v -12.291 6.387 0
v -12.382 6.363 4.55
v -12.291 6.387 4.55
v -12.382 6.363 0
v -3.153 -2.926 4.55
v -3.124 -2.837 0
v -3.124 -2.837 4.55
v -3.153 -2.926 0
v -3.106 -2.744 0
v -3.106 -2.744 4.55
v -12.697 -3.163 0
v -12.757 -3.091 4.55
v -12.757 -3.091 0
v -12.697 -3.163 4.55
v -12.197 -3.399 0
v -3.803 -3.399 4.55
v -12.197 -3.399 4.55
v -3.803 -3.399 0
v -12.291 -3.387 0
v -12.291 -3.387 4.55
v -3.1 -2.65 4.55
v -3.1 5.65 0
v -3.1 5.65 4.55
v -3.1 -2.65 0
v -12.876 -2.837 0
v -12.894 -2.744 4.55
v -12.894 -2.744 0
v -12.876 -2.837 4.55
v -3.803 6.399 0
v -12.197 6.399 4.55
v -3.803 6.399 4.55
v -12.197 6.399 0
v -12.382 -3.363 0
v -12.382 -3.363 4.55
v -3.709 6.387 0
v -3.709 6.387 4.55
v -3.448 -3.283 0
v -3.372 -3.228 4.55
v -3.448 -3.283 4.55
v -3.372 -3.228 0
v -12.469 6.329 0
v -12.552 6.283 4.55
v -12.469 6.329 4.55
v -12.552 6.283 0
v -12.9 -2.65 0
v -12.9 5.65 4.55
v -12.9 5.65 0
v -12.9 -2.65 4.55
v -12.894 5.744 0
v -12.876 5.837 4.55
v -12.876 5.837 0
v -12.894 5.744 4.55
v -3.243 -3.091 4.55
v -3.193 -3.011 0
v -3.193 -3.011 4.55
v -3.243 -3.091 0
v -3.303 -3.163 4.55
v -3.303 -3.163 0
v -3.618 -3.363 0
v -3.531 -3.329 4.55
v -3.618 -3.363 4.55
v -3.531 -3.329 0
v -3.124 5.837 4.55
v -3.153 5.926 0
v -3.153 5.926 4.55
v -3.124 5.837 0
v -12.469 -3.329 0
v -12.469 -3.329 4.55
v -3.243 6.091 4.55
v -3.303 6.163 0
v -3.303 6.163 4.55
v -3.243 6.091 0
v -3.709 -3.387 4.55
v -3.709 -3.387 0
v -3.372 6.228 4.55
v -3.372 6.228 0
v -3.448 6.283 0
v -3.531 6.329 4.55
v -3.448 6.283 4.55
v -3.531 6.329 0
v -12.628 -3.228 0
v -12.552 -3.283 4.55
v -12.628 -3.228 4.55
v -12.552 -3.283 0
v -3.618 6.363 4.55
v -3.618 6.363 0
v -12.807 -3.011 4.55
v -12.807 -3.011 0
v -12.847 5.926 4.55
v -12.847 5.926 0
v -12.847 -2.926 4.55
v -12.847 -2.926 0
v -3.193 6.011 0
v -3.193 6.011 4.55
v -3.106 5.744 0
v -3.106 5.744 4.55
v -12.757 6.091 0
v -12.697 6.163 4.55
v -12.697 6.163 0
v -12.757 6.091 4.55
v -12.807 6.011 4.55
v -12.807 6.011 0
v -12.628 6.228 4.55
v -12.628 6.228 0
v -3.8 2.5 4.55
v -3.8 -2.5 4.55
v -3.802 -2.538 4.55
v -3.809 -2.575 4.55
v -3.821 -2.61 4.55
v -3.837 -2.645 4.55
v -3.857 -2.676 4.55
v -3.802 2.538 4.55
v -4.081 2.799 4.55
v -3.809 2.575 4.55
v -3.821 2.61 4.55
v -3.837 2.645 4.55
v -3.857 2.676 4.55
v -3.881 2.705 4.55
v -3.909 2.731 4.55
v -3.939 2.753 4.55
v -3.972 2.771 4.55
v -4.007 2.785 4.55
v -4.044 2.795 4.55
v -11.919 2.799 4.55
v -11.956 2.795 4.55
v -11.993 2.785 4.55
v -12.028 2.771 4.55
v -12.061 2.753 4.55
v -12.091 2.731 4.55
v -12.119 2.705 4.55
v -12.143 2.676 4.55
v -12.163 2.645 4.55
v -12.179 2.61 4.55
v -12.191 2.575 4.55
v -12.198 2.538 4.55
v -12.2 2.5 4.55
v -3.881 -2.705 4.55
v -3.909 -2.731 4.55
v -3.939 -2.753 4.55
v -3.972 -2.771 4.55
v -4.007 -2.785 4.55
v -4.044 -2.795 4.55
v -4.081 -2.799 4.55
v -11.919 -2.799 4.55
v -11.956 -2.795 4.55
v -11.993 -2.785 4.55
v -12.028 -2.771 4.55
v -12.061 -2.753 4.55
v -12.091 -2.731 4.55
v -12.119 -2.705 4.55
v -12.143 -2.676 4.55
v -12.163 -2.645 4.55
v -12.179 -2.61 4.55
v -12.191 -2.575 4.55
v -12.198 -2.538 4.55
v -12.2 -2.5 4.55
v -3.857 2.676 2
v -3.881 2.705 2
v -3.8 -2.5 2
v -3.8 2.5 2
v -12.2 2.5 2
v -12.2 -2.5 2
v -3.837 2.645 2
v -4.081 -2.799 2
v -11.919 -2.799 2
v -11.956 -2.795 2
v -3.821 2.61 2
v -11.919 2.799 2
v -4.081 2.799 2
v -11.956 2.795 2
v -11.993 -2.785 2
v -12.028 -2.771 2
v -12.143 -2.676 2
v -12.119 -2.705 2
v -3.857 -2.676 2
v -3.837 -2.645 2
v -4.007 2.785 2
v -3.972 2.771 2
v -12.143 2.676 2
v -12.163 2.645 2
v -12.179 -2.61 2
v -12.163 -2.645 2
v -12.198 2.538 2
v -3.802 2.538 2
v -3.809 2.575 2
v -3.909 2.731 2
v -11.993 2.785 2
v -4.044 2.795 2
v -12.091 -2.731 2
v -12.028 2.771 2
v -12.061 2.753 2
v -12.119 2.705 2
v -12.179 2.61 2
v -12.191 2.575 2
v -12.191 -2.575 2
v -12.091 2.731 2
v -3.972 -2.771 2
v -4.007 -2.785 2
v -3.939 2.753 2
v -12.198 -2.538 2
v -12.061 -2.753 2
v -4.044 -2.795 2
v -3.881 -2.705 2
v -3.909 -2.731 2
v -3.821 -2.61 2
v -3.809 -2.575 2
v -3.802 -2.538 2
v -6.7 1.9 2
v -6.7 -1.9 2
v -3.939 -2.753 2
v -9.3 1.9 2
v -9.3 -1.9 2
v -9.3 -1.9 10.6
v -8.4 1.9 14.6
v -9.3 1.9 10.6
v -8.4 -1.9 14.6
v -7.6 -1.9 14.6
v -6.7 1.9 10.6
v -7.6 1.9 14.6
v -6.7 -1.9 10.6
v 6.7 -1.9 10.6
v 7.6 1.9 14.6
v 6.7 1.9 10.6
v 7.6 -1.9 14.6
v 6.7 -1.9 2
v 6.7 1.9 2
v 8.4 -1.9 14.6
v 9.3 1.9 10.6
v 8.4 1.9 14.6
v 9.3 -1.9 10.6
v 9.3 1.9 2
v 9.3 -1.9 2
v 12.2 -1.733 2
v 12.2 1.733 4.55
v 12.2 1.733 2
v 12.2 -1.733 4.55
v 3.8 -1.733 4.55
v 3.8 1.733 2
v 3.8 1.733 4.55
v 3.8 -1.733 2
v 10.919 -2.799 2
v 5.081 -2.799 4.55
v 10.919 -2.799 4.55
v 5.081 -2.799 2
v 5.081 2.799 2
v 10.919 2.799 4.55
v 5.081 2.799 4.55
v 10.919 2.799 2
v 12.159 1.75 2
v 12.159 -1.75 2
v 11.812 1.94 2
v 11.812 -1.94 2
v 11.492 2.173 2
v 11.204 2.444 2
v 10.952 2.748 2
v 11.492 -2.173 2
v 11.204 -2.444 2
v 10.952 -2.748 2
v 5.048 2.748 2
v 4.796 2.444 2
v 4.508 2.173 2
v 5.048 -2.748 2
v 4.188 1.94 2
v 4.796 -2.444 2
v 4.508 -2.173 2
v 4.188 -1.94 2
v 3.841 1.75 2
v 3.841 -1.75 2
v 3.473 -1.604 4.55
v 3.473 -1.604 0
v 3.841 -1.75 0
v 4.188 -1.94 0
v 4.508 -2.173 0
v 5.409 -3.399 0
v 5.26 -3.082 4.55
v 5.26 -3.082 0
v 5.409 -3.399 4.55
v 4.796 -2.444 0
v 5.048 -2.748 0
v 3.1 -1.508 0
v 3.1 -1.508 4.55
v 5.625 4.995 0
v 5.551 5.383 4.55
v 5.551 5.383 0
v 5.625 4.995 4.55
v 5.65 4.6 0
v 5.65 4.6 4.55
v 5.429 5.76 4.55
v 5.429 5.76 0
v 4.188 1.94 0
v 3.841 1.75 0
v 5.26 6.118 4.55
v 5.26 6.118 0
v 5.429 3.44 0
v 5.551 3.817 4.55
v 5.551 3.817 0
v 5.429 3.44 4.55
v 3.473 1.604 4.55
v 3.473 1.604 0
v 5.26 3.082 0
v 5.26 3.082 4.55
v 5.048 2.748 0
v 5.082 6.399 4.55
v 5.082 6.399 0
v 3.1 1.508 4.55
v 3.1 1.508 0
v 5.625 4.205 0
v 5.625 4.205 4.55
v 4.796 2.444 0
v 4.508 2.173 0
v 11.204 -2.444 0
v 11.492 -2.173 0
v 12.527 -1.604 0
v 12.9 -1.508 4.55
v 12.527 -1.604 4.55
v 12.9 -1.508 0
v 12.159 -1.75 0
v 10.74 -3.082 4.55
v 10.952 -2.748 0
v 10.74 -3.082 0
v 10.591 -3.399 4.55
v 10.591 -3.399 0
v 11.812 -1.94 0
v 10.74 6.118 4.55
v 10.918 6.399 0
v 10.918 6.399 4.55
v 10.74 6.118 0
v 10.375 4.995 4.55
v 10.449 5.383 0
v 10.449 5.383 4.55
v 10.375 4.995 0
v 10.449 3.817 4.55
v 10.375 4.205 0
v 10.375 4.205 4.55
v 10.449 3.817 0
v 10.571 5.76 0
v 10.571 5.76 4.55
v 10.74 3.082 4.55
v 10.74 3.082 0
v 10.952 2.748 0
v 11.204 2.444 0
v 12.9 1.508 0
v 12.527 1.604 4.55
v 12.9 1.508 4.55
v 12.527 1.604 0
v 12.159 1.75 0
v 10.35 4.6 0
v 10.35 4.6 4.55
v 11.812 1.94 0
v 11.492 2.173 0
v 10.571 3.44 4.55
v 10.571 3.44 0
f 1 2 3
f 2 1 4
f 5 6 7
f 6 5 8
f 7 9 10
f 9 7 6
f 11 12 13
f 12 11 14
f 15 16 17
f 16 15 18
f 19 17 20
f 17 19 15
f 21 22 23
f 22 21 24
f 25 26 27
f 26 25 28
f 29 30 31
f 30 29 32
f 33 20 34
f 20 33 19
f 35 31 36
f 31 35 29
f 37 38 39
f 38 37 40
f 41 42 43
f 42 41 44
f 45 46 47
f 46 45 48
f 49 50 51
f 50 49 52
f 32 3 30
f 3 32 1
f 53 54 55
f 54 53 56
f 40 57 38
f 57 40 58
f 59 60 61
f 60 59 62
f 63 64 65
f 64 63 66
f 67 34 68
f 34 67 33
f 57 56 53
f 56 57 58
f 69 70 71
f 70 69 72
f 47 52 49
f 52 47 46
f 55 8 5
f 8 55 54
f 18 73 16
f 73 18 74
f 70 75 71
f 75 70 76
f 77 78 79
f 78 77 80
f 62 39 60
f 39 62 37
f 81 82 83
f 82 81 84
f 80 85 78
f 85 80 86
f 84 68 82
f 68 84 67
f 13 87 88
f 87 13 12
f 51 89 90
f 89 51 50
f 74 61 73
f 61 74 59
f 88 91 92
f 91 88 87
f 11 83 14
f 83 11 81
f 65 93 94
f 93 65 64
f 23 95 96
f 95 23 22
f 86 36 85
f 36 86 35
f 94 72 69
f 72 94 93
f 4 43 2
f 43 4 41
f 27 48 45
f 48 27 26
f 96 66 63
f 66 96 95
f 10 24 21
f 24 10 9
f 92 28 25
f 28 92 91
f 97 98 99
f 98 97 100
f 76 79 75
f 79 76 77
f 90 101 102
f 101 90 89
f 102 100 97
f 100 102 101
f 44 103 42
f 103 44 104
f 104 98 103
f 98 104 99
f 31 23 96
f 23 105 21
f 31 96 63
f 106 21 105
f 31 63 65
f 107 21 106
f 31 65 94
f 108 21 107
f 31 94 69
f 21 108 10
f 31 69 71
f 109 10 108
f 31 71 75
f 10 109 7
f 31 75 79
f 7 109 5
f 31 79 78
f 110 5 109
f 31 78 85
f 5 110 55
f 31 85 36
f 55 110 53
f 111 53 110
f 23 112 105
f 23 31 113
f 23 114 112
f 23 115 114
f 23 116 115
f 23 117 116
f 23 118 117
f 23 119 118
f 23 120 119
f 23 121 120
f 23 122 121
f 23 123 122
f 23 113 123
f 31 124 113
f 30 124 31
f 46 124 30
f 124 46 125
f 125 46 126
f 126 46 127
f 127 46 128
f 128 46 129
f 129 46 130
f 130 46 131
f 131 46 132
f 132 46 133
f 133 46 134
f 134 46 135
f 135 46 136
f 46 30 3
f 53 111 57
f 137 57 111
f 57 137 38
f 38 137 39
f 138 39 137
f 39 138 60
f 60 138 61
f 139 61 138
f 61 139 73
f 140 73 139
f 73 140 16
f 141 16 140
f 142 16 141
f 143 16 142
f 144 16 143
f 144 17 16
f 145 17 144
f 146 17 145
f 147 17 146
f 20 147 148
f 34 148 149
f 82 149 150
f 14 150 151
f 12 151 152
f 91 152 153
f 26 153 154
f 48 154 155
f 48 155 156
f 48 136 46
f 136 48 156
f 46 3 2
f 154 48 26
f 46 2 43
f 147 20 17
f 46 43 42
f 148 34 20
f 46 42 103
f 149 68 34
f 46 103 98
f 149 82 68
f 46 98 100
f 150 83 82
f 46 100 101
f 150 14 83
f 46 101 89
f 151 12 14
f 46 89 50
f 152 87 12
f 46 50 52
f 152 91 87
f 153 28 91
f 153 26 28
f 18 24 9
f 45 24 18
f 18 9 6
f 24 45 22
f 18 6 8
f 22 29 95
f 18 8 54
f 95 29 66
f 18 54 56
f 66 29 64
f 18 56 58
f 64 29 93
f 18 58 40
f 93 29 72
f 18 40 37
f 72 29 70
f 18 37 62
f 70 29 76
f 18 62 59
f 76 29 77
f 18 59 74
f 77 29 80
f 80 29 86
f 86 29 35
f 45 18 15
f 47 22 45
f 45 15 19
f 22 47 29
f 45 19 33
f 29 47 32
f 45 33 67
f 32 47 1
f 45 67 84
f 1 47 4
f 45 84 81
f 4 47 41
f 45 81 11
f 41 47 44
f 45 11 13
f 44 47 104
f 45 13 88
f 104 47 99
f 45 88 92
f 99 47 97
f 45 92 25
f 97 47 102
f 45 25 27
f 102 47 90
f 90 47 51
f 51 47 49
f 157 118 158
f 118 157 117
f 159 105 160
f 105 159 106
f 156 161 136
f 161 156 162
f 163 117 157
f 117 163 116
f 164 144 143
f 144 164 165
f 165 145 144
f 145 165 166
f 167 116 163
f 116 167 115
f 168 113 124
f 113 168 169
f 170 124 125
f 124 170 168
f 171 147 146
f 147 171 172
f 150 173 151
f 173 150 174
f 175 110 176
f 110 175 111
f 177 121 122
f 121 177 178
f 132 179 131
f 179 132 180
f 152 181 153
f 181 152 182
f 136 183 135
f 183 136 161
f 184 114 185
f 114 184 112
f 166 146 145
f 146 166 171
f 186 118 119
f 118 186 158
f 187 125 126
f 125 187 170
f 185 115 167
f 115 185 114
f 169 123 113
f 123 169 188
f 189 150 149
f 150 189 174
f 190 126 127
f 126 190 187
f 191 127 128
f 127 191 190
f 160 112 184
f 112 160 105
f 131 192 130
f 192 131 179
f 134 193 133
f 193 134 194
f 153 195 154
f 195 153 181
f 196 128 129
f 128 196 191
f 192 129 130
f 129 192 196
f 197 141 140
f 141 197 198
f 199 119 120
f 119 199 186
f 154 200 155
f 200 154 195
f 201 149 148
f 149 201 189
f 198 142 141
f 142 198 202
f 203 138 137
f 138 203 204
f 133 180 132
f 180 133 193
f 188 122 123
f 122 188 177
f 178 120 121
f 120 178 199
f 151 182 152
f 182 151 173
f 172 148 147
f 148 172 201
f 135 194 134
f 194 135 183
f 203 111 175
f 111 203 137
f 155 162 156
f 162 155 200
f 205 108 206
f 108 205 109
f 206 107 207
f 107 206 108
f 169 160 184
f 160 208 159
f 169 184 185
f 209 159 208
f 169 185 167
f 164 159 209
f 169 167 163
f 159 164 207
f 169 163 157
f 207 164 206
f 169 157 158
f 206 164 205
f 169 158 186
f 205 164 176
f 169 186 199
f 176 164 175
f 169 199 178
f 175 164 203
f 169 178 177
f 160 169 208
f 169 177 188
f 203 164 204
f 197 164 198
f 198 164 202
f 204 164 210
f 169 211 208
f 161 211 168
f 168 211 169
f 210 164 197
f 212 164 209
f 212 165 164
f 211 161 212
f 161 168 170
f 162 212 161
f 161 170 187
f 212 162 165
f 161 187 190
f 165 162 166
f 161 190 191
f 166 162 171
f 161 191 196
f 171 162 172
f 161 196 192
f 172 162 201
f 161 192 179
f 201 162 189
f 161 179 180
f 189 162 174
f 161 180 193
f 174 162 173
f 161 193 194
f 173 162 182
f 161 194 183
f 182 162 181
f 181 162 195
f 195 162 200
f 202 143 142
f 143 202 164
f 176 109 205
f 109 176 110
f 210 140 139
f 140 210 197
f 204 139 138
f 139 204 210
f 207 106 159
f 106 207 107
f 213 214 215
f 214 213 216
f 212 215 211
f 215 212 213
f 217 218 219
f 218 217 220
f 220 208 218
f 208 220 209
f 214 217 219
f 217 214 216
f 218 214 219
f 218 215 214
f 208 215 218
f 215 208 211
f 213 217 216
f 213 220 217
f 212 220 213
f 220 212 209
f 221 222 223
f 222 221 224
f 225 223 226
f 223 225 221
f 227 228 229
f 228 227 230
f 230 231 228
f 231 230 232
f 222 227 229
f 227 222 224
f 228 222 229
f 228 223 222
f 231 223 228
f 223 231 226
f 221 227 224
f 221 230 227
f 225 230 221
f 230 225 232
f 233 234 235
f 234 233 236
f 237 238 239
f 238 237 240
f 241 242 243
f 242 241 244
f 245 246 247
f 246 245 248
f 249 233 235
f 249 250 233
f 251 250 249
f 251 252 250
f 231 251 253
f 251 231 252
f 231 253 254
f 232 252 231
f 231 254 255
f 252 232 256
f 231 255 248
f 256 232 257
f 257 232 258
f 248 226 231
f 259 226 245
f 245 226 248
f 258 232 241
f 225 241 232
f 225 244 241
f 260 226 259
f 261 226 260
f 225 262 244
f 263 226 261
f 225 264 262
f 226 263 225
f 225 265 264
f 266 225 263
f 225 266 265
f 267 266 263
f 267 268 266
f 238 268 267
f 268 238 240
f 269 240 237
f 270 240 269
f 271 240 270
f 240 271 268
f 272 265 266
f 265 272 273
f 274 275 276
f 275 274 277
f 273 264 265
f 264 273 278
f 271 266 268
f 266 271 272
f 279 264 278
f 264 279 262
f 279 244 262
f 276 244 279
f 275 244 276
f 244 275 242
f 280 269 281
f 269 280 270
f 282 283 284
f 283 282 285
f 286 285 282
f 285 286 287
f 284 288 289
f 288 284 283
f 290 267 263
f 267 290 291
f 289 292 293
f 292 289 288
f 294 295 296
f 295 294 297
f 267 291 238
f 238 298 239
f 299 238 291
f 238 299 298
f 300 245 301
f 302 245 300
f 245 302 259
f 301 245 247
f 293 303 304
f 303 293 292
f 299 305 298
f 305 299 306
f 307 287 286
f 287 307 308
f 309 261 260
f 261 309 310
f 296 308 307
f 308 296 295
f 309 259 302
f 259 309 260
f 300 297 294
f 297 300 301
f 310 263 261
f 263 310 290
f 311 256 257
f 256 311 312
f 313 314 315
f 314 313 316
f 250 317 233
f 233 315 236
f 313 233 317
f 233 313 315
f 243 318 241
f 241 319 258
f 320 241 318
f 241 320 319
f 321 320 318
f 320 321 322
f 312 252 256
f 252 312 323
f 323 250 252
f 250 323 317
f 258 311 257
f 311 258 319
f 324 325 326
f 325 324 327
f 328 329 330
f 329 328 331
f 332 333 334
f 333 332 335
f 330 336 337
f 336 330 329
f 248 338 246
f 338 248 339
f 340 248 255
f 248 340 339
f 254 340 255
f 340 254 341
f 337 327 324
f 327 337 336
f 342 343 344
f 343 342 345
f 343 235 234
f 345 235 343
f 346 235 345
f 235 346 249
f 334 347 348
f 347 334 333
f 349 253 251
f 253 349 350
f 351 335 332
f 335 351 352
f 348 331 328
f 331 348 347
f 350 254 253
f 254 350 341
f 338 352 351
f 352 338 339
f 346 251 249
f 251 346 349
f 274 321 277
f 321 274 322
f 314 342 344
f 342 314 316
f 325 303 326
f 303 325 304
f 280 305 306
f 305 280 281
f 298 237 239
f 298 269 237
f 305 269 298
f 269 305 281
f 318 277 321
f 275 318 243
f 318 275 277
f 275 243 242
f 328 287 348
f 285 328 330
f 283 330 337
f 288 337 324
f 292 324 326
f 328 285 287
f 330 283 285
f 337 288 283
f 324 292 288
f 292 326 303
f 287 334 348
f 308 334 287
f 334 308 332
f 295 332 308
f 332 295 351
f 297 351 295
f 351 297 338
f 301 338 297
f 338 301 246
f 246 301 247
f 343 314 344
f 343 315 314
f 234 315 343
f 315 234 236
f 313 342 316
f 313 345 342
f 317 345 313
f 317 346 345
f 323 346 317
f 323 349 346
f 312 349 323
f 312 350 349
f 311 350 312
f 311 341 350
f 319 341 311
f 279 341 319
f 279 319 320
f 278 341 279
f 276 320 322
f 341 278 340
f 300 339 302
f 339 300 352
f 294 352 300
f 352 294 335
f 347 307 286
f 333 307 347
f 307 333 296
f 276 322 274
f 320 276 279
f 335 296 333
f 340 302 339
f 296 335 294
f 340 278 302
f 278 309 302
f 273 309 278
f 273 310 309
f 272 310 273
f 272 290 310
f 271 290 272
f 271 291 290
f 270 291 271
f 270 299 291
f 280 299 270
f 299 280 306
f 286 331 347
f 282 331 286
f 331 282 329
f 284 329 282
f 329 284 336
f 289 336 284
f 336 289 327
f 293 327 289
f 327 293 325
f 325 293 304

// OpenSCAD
translate([-8,0,0]) { 
// Archived geometry from ../../parts/oobb_organization_storage_drawer_unit_rectangle_100_ml_tamper_evident_systempak_209_container_2_column_7_row_ai_version_7_style_double_sided_plywood_250_max/front_plug_square.scad
$fn = 50;

difference() {
	union() {
		translate(v = [0, 0, 0]) {
			rotate(a = [0, 0, 0]) {
				difference() {
					union() {
						translate(v = [0, 0, 0]) {
							rotate(a = [0, 0, 0]) {
								difference() {
									union() {
										translate(v = [0, 0, 0]) {
											rotate(a = [0, 0, 0]) {
												difference() {
													union() {
														translate(v = [0, 1.5, 0]) {
															hull() {
																translate(v = [-4.15, 4.15, 0]) {
																	cylinder(h = 4.55, r = 0.75);
																}
																translate(v = [4.15, 4.15, 0]) {
																	cylinder(h = 4.55, r = 0.75);
																}
																translate(v = [-4.15, -4.15, 0]) {
																	cylinder(h = 4.55, r = 0.75);
																}
																translate(v = [4.15, -4.15, 0]) {
																	cylinder(h = 4.55, r = 0.75);
																}
															}
														}
													}
													union() {
														translate(v = [0, 0, 2.0]) {
															hull() {
																translate(v = [-3.9000000000000004, 2.5, 0]) {
																	cylinder(h = 2.65, r = 0.3);
																}
																translate(v = [3.9000000000000004, 2.5, 0]) {
																	cylinder(h = 2.65, r = 0.3);
																}
																translate(v = [-3.9000000000000004, -2.5, 0]) {
																	cylinder(h = 2.65, r = 0.3);
																}
																translate(v = [3.9000000000000004, -2.5, 0]) {
																	cylinder(h = 2.65, r = 0.3);
																}
															}
														}
													}
												}
											}
										}
										translate(v = [0, 0, 0]) {
											rotate(a = [0, 0, 0]) {
												difference() {
													union() {
														translate(v = [-1.4000000000000001, -1.9, 1.95]) {
															cube(size = [2.8000000000000003, 3.8, 12.65]);
														}
													}
													union() {
														translate(v = [0, 2.0, 0]) {
															rotate(a = [90, 0, 0]) {
																linear_extrude(height = 4.0) {
																	polygon(points = [[-1.3, 1.85], [-1.3, 10.6], [-0.4, 14.6], [-0.4, 14.799999999999999], [-1.6, 14.799999999999999], [-1.6, 1.85]]);
																}
															}
														}
														translate(v = [0, 2.0, 0]) {
															rotate(a = [90, 0, 0]) {
																linear_extrude(height = 4.0) {
																	polygon(points = [[1.3, 1.85], [1.3, 10.6], [0.4, 14.6], [0.4, 14.799999999999999], [1.6, 14.799999999999999], [1.6, 1.85]]);
																}
															}
														}
													}
												}
											}
										}
									}
									union();
								}
							}
						}
					}
					union();
				}
			}
		}
	}
	union();
}
 }
translate([8,0,0]) { 
// Archived geometry from ../../parts/oobb_organization_storage_drawer_unit_rectangle_100_ml_tamper_evident_systempak_209_container_2_column_7_row_ai_version_7_style_double_sided_plywood_250_max/front_plug.scad
$fn = 50;

difference() {
	union() {
		translate(v = [0, 0, 0]) {
			rotate(a = [0, 0, 0]) {
				difference() {
					union() {
						translate(v = [0, 0, 0]) {
							rotate(a = [0, 0, 0]) {
								difference() {
									union() {
										translate(v = [0, 0, 0]) {
											rotate(a = [0, 0, 0]) {
												difference() {
													union() {
														translate(v = [0, 1.5, 0]) {
															hull() {
																translate(v = [-4.15, 4.15, 0]) {
																	cylinder(h = 4.55, r = 0.75);
																}
																translate(v = [4.15, 4.15, 0]) {
																	cylinder(h = 4.55, r = 0.75);
																}
																translate(v = [-4.15, -4.15, 0]) {
																	cylinder(h = 4.55, r = 0.75);
																}
																translate(v = [4.15, -4.15, 0]) {
																	cylinder(h = 4.55, r = 0.75);
																}
															}
														}
													}
													union() {
														translate(v = [0, 0, 2.0]) {
															hull() {
																translate(v = [-3.9000000000000004, 2.5, 0]) {
																	cylinder(h = 2.65, r = 0.3);
																}
																translate(v = [3.9000000000000004, 2.5, 0]) {
																	cylinder(h = 2.65, r = 0.3);
																}
																translate(v = [-3.9000000000000004, -2.5, 0]) {
																	cylinder(h = 2.65, r = 0.3);
																}
																translate(v = [3.9000000000000004, -2.5, 0]) {
																	cylinder(h = 2.65, r = 0.3);
																}
															}
														}
														translate(v = [-5.5, -4.6, -0.1]) {
															cylinder(h = 4.75, r = 3.15);
														}
														translate(v = [-5.5, 4.6, -0.1]) {
															cylinder(h = 4.75, r = 3.15);
														}
														translate(v = [5.5, -4.6, -0.1]) {
															cylinder(h = 4.75, r = 3.15);
														}
														translate(v = [5.5, 4.6, -0.1]) {
															cylinder(h = 4.75, r = 3.15);
														}
													}
												}
											}
										}
										translate(v = [0, 0, 0]) {
											rotate(a = [0, 0, 0]) {
												difference() {
													union() {
														translate(v = [-1.4000000000000001, -1.9, 1.95]) {
															cube(size = [2.8000000000000003, 3.8, 12.65]);
														}
													}
													union() {
														translate(v = [0, 2.0, 0]) {
															rotate(a = [90, 0, 0]) {
																linear_extrude(height = 4.0) {
																	polygon(points = [[-1.3, 1.85], [-1.3, 10.6], [-0.4, 14.6], [-0.4, 14.799999999999999], [-1.6, 14.799999999999999], [-1.6, 1.85]]);
																}
															}
														}
														translate(v = [0, 2.0, 0]) {
															rotate(a = [90, 0, 0]) {
																linear_extrude(height = 4.0) {
																	polygon(points = [[1.3, 1.85], [1.3, 10.6], [0.4, 14.6], [0.4, 14.799999999999999], [1.6, 14.799999999999999], [1.6, 1.85]]);
																}
															}
														}
													}
												}
											}
										}
									}
									union();
								}
							}
						}
					}
					union();
				}
			}
		}
	}
	union();
}
 }
